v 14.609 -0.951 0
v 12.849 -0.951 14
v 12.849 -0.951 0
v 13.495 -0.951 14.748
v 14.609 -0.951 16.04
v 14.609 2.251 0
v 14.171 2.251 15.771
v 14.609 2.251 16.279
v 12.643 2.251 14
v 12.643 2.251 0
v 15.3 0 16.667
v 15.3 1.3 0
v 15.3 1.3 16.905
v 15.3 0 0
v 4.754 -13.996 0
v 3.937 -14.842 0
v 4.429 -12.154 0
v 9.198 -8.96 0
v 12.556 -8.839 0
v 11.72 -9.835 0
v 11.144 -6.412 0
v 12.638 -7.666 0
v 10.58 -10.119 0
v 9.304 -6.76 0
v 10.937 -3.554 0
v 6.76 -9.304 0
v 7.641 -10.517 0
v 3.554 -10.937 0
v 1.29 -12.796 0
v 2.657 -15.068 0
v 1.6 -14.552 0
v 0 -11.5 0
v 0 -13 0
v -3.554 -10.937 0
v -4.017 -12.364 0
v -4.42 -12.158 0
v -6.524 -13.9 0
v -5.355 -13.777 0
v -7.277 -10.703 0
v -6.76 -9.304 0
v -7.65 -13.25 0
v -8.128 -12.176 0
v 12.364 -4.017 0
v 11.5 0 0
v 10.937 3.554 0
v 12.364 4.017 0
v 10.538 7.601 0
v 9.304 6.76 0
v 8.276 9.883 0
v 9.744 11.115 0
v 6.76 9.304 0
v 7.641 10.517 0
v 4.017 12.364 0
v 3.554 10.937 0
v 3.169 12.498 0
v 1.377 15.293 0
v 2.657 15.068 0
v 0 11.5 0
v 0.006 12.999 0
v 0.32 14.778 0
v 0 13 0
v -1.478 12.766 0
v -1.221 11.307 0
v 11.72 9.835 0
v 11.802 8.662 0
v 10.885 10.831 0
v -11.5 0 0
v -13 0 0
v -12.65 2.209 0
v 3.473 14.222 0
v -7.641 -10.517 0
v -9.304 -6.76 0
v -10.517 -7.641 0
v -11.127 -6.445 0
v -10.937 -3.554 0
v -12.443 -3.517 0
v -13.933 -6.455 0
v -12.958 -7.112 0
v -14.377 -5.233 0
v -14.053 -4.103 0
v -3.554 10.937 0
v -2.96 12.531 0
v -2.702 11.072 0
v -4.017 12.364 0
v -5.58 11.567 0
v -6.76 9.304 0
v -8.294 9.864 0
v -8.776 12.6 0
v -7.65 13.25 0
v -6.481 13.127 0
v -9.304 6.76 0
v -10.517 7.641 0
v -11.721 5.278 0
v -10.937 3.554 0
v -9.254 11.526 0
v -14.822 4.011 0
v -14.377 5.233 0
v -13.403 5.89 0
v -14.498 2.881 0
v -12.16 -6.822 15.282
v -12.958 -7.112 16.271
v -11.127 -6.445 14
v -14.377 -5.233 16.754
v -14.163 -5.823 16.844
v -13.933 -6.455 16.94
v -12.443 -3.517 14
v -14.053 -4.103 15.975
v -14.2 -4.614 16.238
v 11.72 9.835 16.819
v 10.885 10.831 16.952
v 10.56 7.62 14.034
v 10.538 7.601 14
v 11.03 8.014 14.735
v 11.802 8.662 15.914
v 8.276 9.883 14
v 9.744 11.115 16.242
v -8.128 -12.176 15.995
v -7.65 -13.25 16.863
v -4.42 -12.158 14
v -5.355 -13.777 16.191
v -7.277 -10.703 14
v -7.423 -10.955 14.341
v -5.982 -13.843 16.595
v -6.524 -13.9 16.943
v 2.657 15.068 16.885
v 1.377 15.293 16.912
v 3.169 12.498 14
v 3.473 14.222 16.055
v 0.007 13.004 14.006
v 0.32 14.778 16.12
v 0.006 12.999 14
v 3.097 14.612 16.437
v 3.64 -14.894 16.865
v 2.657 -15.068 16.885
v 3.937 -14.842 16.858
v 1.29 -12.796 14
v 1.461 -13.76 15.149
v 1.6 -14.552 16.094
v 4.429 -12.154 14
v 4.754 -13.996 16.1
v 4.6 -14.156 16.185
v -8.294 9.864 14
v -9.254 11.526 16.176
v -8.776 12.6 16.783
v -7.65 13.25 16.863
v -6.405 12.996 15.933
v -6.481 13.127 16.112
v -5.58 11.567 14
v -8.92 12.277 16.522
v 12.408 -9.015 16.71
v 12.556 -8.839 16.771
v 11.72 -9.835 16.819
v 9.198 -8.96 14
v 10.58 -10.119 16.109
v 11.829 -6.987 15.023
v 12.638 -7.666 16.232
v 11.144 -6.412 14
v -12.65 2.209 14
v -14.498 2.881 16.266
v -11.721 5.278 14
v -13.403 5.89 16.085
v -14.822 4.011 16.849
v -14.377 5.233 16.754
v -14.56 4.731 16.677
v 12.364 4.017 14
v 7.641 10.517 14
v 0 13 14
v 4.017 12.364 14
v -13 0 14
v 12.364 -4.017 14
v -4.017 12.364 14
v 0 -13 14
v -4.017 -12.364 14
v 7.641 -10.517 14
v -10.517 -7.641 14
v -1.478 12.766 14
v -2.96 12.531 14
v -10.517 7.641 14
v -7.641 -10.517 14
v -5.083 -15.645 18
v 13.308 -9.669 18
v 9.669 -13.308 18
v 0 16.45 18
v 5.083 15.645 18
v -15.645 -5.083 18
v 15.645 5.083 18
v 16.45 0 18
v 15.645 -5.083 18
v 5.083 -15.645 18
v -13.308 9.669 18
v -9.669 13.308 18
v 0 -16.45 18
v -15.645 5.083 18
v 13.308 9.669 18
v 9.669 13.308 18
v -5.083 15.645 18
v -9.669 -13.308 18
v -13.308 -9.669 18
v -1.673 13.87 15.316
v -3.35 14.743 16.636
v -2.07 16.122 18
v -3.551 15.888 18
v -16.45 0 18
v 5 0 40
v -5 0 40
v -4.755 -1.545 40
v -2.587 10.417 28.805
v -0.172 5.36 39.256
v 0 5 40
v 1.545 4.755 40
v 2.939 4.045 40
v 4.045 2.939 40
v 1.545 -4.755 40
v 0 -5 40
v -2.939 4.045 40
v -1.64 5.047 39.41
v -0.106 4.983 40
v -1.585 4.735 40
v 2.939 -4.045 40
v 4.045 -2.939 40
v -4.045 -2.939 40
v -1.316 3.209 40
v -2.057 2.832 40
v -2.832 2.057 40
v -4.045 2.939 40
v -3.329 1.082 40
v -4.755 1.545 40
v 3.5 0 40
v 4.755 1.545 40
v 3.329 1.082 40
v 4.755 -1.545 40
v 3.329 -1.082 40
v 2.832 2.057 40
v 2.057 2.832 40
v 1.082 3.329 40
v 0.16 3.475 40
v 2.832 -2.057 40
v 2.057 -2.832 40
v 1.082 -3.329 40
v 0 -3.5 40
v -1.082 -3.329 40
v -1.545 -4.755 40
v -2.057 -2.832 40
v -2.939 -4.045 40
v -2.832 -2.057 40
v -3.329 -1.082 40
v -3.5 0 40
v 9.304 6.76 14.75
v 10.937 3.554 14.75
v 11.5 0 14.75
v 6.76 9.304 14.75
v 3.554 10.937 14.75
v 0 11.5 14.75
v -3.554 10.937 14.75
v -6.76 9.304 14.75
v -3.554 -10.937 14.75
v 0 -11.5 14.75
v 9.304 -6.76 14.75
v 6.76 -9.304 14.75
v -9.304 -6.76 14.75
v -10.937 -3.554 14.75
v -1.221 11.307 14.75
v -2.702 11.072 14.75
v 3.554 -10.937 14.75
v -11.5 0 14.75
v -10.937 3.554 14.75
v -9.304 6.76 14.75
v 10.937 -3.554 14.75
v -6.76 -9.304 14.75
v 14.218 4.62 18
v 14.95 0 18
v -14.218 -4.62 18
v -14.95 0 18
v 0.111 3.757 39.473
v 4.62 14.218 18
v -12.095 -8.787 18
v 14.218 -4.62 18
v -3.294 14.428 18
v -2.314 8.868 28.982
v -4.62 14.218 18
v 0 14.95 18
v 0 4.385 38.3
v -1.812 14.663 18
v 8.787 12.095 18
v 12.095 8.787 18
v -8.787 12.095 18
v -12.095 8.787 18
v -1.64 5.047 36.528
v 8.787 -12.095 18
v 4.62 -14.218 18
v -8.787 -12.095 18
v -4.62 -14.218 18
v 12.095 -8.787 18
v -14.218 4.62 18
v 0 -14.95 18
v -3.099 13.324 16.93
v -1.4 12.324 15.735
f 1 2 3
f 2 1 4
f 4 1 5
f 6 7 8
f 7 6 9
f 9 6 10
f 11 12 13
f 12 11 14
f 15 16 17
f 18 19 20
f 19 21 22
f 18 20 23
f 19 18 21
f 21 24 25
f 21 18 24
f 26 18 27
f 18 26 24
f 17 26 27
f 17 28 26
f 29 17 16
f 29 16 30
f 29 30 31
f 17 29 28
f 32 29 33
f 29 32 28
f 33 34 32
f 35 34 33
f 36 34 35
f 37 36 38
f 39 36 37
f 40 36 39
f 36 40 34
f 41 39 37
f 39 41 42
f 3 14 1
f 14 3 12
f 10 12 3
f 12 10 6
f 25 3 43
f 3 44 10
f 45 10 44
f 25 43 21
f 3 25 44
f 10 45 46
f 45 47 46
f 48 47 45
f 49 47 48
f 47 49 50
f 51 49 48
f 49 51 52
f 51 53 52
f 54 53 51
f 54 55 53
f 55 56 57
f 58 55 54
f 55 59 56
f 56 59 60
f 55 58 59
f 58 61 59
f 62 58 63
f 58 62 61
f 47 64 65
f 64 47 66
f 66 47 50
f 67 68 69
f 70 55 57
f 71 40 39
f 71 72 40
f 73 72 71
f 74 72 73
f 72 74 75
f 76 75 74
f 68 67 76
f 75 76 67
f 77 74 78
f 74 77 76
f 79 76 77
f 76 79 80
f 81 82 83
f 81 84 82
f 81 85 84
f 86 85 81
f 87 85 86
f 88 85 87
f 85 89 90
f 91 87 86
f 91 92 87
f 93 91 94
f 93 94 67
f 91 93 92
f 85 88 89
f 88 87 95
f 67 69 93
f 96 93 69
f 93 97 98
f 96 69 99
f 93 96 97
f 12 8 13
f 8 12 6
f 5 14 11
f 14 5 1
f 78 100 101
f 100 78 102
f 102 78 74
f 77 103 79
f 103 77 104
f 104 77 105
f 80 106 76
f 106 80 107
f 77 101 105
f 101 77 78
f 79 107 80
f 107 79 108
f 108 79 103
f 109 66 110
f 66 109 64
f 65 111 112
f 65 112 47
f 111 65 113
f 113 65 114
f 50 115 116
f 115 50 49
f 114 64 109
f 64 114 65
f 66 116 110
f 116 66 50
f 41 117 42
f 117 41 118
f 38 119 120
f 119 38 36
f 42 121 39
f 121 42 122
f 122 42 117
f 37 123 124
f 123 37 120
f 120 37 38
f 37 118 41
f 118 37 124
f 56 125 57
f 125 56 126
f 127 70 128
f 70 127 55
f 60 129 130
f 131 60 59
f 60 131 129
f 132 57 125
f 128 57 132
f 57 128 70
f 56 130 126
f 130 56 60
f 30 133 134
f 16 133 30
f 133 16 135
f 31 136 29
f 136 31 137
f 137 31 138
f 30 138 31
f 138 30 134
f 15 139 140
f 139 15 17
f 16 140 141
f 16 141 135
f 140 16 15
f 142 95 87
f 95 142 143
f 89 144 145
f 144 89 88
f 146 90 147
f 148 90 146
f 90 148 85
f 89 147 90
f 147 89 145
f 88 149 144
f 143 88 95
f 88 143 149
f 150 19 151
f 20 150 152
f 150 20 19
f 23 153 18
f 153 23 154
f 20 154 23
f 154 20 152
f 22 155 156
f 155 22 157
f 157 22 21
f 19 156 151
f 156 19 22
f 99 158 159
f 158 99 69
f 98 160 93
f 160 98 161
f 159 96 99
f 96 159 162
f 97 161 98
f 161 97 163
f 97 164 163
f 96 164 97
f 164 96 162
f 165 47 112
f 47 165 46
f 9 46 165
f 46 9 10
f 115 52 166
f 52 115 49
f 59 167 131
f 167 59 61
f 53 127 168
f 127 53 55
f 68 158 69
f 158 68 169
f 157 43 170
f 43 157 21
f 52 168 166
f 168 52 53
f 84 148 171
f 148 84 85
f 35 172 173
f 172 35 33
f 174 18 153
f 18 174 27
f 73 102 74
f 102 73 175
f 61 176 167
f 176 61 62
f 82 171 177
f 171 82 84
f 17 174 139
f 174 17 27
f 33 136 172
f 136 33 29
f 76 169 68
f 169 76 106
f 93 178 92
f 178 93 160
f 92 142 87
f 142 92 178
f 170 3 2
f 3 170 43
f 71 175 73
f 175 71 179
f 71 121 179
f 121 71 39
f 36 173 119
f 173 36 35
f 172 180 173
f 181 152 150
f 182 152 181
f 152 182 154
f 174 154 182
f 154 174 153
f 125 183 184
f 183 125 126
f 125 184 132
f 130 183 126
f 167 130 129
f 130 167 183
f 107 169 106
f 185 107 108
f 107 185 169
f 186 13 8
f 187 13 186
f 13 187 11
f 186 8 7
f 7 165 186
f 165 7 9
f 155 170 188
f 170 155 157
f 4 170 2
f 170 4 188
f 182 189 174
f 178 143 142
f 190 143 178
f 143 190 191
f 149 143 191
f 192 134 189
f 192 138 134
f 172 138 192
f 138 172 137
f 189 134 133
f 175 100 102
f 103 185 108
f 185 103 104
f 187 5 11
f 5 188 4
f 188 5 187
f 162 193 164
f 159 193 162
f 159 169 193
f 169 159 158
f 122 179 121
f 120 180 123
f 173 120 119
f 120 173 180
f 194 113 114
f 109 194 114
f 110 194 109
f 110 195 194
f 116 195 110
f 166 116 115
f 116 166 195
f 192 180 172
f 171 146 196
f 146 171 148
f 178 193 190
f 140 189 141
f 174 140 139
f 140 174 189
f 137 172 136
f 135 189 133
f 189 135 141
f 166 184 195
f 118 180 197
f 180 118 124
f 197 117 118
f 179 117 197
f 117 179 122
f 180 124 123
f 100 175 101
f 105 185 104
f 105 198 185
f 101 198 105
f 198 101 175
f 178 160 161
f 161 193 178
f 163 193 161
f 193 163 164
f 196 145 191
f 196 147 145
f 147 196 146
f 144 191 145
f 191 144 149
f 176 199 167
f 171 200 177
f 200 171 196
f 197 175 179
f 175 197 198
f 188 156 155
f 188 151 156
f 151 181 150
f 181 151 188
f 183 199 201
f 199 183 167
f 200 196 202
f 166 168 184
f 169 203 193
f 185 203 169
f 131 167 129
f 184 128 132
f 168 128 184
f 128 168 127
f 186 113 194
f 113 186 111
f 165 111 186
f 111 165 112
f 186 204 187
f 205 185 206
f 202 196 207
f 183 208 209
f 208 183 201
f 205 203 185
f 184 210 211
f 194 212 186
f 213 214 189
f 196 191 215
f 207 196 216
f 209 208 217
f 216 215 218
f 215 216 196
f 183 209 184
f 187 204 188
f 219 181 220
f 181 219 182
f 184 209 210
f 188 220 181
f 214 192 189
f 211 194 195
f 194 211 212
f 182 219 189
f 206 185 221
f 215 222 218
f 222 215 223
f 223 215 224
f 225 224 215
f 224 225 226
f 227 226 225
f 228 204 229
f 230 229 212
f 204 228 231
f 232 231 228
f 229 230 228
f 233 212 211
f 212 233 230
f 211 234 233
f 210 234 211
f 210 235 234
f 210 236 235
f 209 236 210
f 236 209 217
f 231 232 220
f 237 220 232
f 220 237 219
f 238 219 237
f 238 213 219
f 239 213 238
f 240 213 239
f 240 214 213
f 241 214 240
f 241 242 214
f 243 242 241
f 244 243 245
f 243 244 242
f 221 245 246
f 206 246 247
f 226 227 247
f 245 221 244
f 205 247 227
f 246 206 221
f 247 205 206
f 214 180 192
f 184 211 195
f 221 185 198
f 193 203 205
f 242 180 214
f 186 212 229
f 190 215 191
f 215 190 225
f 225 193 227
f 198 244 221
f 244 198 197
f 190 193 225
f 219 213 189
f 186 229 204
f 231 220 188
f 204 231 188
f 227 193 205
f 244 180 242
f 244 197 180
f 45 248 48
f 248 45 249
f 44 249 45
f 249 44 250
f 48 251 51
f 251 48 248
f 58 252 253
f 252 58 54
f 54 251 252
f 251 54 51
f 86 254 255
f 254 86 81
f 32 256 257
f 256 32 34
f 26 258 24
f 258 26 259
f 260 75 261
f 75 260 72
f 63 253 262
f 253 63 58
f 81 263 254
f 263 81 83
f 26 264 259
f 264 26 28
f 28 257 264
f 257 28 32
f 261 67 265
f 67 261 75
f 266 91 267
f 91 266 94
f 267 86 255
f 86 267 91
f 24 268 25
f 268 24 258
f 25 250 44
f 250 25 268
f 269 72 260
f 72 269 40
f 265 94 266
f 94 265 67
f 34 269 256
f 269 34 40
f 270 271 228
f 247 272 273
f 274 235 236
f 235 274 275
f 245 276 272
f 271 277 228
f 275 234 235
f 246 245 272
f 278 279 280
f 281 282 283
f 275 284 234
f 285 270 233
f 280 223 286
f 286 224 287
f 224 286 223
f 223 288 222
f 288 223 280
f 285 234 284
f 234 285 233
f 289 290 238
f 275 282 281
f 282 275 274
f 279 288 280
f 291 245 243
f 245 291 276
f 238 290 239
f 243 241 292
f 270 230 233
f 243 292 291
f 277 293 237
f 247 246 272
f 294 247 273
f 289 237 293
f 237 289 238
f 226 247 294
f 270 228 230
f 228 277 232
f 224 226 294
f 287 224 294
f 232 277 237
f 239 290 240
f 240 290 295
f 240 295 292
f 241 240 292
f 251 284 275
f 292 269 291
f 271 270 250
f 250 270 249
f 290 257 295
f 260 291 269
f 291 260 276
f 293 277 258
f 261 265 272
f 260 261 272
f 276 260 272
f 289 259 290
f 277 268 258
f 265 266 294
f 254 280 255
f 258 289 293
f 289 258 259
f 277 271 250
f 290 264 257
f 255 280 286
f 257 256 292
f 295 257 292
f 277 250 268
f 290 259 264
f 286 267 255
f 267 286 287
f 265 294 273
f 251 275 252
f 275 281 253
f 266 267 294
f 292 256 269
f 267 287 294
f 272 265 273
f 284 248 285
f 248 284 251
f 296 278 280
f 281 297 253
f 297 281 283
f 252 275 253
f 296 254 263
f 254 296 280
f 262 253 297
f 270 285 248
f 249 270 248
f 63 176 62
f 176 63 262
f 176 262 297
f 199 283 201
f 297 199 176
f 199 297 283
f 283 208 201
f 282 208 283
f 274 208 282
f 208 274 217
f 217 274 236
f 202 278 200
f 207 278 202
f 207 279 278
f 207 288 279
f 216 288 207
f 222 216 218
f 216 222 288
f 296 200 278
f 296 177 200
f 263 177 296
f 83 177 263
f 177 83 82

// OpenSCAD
// Global Parameters

// Top cone
r1 = 5.00;  // Radius of narrow point of cone
h1 = 22.00; // Height of cone

// Middle cone
r3 = 16.45; // Radius of inverted cone AND top cone
h3 = 4.00;  // Height of inverted cone

// Lower cylinder
r2 = 13.00; // Radius of lower cylinder
h2 = 14.00; // Height of lower cylinder

// Other
protrusion = 2.30;   // Size of protrusions
thickness   = 1.50;  // Thickness of skin
precision   = 20.00; // Circular precision

module shroudcap() {

    difference() {

        // Things that exist
        union() {

            // The base circle
            cylinder( h = h2, r = r2, $fn = precision );

            // The protrusions
            for (angle = [ 0 : 5 : 360 ] ) {
                rotate( a = 360/9 * angle ) {
                    minkowski() {
                        cube( size = [r2 + protrusion - 1.0, protrusion - 1.0, h2 + h3]);
                        cylinder( r = 1, h = 1 );
                    }
                }
            }

            // Inverted cone
            translate( v = [0,0,h2]) {
                cylinder( h = h3, r1 = r2, r2 = r3, $fn = precision);
            }

            // Base for cone
            translate( v = [0,0,h2 + h3]) {
                cylinder( h = h1, r1 = r3, r2 = r1, $fn = precision);
            }
        }

        // Things to be cut out
        union() {
            // The inside of the base circle
            cylinder( h = h2 + thickness, r = r2 - thickness, $fn = precision );

            // Base for cone
            translate( v = [0,0,h2 + h3]) {
                cylinder( h = h1, r1 = r3 - thickness, r2 = r1 - thickness, $fn = precision);
            }

            // Inverted cone
            translate( v = [0,0,h2 + thickness/2]) {
                cylinder( h = h3 - thickness/2, r1 = r2 - thickness, r2 = r3 - thickness, $fn = precision);
            }

            // Take slice out
            translate(v = [-thickness/2,0,0]) {
                rotate( a = [0, 0, 10]) {
                    cube( size = [thickness, r3 + thickness, h1+h2+h3]);
                }
            }

            // Cut-away to inspect insides
            // cube( size = [ 2 * (r3 + thickness), r3 + thickness, h1+h2+h3]);
        }
    }

}

//translate( v = [0,0,-h3-h2]) {
shroudcap();
//}
